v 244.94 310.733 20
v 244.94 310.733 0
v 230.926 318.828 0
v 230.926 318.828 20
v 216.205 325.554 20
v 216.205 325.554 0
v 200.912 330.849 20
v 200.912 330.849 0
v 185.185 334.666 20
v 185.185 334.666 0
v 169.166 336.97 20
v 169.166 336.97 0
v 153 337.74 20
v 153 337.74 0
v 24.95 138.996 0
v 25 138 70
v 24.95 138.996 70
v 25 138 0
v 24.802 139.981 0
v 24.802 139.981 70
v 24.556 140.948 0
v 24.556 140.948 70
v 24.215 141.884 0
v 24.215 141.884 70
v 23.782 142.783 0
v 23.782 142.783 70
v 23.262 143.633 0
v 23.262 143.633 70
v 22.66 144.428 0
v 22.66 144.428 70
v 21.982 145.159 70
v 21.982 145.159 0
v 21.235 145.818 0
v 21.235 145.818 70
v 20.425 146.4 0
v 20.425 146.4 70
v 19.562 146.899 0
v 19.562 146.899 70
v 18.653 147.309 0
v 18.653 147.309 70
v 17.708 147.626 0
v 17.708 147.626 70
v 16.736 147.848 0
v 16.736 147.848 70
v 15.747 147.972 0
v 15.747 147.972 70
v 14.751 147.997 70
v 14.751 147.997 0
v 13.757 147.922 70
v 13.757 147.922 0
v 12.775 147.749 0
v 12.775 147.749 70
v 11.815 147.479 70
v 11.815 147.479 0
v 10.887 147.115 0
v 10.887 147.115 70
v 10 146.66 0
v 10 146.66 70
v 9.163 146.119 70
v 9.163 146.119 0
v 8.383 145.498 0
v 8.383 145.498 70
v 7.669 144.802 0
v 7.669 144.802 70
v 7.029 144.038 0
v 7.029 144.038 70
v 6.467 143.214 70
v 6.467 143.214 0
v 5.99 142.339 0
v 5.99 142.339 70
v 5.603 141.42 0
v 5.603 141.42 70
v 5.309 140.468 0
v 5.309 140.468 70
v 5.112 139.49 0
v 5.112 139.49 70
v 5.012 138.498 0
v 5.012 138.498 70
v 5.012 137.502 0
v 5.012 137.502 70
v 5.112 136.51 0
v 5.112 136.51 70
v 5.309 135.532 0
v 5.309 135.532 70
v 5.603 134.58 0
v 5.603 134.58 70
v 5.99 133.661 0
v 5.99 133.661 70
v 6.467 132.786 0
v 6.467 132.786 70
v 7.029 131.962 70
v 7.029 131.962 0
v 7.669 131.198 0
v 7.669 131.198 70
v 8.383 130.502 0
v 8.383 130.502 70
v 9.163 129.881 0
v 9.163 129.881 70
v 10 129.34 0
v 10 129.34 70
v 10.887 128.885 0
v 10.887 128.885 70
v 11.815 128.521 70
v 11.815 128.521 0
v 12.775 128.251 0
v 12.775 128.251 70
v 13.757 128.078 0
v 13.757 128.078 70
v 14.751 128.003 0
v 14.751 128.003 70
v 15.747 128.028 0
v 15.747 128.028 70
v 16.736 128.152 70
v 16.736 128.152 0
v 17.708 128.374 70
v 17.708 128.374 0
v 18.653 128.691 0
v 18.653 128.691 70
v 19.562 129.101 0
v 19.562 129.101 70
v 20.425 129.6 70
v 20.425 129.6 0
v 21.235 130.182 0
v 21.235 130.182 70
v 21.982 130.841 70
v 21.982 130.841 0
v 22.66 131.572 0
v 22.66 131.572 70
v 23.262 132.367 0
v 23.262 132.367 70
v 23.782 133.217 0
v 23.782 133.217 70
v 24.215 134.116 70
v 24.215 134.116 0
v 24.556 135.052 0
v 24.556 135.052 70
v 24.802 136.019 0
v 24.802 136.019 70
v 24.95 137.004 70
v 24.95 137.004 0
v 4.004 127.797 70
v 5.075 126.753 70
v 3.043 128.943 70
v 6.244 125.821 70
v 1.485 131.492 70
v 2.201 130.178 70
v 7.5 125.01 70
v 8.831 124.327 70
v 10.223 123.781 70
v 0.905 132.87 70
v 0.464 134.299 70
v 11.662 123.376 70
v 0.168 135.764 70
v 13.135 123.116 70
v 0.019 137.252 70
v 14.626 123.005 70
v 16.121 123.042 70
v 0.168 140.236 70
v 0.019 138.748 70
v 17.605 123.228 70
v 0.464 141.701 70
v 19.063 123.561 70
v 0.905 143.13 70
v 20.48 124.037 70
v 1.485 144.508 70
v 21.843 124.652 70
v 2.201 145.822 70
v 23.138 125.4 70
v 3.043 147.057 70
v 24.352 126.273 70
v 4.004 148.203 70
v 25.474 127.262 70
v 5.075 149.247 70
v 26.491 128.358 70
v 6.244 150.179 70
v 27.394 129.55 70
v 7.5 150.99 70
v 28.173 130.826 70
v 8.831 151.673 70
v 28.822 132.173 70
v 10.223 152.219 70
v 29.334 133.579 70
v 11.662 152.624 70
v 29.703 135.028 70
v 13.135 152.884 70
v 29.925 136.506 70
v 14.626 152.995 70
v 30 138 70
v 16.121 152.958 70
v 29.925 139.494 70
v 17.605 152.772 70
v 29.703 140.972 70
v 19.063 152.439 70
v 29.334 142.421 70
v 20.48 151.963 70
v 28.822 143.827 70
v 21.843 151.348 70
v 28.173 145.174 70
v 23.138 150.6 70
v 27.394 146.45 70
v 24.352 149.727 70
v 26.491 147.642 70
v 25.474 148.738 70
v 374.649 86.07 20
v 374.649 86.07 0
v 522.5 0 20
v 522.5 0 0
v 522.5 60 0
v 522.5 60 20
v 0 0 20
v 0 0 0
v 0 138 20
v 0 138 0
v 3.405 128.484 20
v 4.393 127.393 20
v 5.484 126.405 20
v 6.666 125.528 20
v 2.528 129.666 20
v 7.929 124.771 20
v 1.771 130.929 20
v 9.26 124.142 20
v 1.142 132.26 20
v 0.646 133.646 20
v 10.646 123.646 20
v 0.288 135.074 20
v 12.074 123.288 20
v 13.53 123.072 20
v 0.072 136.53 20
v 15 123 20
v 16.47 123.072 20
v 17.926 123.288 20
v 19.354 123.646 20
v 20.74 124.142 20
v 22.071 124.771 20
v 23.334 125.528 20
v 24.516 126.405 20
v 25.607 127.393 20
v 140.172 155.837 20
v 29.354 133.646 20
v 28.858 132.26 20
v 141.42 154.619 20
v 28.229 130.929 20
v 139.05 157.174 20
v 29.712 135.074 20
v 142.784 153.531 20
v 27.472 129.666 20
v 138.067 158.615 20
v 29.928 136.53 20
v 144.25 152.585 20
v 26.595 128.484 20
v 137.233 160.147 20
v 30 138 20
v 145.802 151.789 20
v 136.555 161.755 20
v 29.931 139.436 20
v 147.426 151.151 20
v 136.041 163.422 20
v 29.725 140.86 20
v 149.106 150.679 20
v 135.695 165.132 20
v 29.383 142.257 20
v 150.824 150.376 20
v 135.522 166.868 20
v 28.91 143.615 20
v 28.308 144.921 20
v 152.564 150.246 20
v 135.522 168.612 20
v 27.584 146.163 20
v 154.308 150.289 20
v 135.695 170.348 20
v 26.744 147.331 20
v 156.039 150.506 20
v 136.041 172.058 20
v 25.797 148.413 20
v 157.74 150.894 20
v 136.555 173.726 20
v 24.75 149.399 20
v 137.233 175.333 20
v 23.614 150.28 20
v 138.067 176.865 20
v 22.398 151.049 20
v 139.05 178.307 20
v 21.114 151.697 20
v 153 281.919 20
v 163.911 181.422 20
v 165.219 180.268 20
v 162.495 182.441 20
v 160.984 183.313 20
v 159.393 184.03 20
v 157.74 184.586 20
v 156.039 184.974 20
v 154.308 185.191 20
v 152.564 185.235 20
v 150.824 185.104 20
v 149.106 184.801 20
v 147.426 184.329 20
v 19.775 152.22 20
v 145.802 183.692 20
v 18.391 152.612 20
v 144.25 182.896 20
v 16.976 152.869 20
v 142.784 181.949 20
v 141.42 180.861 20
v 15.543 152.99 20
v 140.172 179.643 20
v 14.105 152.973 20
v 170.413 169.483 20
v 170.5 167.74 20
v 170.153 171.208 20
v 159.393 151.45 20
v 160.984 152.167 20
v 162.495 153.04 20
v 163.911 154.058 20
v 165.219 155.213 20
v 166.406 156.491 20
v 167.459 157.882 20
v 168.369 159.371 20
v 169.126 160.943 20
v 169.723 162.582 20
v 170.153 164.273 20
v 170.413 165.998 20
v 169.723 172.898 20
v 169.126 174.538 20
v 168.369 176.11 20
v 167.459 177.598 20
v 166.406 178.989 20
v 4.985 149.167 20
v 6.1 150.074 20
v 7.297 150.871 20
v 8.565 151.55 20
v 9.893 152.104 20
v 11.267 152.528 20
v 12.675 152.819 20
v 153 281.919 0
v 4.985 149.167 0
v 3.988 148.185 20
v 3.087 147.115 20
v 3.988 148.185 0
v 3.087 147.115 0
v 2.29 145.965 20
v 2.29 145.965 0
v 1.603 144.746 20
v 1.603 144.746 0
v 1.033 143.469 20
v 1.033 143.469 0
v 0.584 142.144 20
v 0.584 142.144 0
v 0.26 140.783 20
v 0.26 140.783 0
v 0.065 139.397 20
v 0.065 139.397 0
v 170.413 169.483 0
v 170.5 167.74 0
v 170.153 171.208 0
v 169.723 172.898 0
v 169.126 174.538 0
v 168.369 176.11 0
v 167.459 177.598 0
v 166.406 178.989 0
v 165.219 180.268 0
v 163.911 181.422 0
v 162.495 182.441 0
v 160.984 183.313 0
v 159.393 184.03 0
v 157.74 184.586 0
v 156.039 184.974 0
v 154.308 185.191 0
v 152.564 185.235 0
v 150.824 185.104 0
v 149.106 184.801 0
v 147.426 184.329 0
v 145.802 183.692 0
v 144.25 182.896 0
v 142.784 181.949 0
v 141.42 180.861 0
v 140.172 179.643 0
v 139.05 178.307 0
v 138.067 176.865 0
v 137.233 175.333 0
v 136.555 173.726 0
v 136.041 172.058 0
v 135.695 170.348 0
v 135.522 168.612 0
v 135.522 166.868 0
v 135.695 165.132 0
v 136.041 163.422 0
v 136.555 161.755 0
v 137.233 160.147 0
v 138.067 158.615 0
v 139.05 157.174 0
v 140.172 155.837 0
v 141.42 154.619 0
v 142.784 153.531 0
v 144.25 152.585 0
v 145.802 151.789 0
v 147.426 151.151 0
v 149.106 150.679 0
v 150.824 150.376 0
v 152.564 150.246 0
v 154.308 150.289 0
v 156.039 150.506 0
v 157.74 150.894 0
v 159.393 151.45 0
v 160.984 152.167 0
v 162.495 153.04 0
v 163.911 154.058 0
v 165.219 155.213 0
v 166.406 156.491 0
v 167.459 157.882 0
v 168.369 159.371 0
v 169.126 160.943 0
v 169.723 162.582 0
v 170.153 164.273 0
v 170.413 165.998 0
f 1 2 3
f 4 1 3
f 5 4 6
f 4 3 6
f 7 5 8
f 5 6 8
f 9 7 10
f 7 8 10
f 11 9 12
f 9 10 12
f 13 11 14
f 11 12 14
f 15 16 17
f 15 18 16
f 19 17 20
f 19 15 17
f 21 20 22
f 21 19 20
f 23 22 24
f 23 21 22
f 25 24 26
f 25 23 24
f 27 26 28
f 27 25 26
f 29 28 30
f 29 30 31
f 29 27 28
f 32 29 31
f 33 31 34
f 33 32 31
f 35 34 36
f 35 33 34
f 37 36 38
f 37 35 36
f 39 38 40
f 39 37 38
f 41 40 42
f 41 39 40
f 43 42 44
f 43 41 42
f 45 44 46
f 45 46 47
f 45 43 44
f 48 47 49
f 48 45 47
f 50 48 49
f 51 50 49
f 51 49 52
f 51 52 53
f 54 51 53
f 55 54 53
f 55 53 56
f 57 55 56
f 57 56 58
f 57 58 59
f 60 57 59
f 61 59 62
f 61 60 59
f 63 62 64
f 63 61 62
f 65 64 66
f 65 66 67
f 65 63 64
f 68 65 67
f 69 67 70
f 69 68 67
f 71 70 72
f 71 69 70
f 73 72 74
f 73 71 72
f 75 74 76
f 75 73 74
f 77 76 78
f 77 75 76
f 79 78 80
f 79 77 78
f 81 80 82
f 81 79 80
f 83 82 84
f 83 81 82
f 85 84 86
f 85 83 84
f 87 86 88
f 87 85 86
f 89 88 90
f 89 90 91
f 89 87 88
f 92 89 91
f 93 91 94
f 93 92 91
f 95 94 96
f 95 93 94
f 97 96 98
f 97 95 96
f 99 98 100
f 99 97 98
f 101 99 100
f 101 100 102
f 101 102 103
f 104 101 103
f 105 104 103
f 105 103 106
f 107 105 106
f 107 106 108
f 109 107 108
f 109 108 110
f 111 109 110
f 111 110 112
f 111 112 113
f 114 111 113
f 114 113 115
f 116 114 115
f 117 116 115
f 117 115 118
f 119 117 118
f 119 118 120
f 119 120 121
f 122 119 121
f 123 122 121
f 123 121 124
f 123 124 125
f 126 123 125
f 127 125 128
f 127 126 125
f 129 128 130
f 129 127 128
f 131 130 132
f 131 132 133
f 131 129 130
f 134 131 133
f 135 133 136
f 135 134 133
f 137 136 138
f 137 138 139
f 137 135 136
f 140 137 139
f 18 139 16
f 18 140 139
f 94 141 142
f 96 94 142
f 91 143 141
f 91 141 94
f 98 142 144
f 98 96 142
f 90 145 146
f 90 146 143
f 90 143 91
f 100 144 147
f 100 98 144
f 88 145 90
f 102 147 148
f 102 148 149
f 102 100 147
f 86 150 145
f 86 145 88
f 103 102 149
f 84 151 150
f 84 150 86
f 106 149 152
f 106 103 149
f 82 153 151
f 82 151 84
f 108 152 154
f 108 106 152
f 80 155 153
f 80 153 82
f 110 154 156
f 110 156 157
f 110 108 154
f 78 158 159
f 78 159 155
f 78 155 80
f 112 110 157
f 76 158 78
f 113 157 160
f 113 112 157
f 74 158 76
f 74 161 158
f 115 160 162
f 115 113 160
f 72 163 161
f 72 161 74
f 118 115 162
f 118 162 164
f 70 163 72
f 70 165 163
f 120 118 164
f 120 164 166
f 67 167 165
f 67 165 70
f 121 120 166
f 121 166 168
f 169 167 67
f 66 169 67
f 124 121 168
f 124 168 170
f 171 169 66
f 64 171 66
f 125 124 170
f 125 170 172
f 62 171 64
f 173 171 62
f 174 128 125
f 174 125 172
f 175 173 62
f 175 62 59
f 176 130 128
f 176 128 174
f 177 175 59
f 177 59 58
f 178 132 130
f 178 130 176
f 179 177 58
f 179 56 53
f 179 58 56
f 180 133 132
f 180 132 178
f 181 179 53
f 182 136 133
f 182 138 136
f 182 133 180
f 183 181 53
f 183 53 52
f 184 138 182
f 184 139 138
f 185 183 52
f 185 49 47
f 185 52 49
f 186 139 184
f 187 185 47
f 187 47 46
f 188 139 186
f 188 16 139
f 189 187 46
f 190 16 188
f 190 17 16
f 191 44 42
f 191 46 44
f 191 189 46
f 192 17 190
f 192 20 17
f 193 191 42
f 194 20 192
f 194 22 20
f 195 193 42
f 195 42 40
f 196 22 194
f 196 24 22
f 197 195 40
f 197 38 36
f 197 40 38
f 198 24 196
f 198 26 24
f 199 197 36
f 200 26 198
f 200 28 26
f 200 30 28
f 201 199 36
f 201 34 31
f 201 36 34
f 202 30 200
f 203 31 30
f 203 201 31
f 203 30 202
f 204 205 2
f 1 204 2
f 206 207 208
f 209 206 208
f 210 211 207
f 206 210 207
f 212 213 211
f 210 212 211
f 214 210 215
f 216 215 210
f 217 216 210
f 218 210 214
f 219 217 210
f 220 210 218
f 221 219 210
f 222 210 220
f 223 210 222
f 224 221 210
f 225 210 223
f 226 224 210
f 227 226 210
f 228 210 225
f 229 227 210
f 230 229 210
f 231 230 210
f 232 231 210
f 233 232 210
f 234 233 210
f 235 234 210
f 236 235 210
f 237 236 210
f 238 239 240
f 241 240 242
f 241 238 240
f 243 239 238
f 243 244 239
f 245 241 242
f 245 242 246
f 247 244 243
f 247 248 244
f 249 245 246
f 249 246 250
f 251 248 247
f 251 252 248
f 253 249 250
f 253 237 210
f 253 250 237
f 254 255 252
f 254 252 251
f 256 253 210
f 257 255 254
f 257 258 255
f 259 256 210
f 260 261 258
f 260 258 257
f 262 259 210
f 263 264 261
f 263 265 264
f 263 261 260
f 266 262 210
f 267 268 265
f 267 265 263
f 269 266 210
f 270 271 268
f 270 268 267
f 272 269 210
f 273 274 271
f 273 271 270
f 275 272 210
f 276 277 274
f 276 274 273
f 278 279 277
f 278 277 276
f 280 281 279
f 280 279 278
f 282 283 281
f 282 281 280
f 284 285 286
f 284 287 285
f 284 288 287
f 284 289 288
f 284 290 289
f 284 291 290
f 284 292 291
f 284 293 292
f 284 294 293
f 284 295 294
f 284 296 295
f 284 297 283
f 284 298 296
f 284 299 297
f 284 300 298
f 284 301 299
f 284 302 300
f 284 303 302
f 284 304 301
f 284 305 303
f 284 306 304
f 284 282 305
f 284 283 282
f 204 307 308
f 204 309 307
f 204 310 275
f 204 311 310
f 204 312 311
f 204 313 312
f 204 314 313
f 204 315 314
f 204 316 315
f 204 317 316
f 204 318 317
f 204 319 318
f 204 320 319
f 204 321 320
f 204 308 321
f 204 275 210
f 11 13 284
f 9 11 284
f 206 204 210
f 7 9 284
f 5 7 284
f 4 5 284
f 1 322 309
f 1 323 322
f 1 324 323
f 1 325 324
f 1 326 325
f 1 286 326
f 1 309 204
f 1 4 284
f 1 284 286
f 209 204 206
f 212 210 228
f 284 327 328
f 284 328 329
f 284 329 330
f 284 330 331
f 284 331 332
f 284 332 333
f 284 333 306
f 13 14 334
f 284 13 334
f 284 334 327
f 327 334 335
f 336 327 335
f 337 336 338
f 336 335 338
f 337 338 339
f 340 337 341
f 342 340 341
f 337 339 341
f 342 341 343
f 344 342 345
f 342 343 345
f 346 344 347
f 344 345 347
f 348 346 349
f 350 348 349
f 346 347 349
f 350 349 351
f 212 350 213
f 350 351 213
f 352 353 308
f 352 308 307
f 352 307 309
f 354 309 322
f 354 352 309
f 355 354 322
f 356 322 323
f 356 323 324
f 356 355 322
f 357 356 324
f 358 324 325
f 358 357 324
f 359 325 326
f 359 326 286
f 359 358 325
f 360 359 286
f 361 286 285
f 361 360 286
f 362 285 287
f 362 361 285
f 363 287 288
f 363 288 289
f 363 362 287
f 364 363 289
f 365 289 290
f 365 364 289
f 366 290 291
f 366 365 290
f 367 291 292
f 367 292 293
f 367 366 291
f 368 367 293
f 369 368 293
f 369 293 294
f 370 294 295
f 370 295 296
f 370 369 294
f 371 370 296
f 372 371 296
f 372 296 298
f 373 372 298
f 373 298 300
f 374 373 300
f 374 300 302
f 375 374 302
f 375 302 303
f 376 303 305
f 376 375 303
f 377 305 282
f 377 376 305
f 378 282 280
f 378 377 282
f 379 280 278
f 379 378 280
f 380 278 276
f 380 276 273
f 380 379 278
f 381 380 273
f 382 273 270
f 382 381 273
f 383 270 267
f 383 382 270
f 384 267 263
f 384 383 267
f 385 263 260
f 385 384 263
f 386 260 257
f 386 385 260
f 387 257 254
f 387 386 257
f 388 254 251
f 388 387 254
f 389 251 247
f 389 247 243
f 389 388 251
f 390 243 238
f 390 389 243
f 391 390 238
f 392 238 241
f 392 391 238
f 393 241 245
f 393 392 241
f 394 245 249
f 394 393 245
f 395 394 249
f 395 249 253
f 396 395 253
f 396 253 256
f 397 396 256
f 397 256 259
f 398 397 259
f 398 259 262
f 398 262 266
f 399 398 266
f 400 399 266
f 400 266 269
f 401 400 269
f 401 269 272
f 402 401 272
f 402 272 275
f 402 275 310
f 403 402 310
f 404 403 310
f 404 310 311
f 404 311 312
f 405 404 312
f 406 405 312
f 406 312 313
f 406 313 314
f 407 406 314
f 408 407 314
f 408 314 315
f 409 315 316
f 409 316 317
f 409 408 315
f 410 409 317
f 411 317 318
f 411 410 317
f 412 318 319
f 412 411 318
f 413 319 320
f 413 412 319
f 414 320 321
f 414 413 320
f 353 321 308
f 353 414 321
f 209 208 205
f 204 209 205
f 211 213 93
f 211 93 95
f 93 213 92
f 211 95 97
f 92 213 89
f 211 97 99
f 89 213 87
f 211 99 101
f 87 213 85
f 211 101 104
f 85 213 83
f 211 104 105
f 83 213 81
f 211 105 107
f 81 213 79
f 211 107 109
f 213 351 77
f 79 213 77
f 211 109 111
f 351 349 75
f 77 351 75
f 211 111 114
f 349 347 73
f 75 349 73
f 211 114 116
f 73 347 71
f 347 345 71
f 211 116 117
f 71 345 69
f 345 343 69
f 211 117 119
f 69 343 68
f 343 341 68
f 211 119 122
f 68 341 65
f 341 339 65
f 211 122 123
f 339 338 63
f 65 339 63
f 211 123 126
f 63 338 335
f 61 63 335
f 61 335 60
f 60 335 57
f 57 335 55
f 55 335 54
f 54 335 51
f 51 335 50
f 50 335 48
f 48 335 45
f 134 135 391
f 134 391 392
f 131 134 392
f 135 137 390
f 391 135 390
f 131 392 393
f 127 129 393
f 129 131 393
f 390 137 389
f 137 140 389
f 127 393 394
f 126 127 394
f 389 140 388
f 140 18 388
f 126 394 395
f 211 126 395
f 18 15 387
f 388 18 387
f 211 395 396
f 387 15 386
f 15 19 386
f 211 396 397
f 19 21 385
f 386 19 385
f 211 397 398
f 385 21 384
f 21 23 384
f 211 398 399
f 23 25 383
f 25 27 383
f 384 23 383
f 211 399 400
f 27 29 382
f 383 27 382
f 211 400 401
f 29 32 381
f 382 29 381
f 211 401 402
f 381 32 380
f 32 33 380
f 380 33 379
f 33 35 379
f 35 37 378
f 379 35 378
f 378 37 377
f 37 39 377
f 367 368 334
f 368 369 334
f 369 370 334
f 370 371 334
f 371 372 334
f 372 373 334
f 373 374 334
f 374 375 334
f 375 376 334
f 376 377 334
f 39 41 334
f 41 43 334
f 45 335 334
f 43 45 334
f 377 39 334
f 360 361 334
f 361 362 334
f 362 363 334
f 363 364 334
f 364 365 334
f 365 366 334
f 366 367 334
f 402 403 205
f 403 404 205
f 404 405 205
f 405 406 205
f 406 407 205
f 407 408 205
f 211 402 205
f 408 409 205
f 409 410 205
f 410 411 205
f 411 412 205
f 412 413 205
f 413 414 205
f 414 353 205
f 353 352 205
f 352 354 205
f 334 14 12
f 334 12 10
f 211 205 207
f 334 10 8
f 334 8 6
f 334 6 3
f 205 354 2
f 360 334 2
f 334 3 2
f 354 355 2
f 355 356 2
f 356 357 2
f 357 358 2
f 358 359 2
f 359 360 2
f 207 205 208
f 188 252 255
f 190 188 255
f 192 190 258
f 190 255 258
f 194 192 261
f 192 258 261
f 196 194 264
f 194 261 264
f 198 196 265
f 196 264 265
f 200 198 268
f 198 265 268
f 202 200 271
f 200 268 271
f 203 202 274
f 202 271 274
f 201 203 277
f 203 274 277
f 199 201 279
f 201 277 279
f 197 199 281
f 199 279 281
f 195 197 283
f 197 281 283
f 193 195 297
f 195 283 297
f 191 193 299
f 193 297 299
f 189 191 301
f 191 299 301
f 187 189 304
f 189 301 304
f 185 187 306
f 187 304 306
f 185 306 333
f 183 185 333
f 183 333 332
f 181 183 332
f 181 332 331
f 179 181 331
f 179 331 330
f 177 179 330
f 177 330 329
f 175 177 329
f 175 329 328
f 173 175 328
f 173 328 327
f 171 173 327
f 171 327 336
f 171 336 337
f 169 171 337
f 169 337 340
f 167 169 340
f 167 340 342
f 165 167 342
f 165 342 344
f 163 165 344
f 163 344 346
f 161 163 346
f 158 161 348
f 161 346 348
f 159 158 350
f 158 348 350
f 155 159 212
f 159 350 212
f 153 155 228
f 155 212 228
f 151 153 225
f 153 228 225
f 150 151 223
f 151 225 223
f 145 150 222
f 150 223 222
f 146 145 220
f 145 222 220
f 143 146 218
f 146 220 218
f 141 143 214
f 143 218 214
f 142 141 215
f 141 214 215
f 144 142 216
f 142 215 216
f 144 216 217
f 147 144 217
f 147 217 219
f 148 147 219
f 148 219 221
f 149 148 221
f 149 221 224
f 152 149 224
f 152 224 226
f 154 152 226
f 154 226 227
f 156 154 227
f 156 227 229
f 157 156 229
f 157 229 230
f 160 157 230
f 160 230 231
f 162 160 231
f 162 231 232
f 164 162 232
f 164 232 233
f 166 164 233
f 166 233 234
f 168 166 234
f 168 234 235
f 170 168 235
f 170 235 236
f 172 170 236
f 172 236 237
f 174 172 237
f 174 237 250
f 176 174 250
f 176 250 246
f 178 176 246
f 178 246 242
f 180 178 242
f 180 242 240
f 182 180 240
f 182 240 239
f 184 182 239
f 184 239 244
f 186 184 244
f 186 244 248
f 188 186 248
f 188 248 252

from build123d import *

# Parameters (mm, degrees)
SKETCH1_R           = 17.5
SKETCH1_R_2         = 10
BOSS_EXTRUDE1_DEPTH = 20
SKETCH2_R           = 15
SKETCH2_R_2         = 10
BOSS_EXTRUDE2_DEPTH = 50


with BuildPart() as part:
    # Sketch1 → Boss-Extrude1 (new body)
    with BuildSketch(Plane.XY):
        with BuildLine():
            Line((0, 138), (0, 0))
            Line((0, 0), (522.5, 0))
            Line((522.5, 0), (522.5, 60))
            Line((522.5, 60), (374.649400312, 86.070049839))
            Line((374.649400312, 86.070049839), (244.94, 310.733321399))
            ThreePointArc((244.94, 310.733321399), (200.912248971, 330.848790378), (153, 337.740187298))
            Line((153, 337.740187298), (153, 281.918848091))
            Line((153, 281.918848091), (4.984782256, 149.166710059))
            ThreePointArc((4.984782256, 149.166710059), (1.302769146, 144.114398329), (0, 138))
        make_face()
        with Locations((153, 167.740187298)):
            Circle(SKETCH1_R, mode=Mode.SUBTRACT)
        with Locations((15, 138)):
            Circle(SKETCH1_R_2, mode=Mode.SUBTRACT)
    extrude(amount=BOSS_EXTRUDE1_DEPTH)

    # Sketch2 → Boss-Extrude2 (add)
    with BuildSketch(Plane.XY.offset(20)):
        with Locations((15, 138)):
            Circle(SKETCH2_R)
        with Locations((15, 138)):
            Circle(SKETCH2_R_2, mode=Mode.SUBTRACT)
    extrude(amount=BOSS_EXTRUDE2_DEPTH)


solid = part.part
